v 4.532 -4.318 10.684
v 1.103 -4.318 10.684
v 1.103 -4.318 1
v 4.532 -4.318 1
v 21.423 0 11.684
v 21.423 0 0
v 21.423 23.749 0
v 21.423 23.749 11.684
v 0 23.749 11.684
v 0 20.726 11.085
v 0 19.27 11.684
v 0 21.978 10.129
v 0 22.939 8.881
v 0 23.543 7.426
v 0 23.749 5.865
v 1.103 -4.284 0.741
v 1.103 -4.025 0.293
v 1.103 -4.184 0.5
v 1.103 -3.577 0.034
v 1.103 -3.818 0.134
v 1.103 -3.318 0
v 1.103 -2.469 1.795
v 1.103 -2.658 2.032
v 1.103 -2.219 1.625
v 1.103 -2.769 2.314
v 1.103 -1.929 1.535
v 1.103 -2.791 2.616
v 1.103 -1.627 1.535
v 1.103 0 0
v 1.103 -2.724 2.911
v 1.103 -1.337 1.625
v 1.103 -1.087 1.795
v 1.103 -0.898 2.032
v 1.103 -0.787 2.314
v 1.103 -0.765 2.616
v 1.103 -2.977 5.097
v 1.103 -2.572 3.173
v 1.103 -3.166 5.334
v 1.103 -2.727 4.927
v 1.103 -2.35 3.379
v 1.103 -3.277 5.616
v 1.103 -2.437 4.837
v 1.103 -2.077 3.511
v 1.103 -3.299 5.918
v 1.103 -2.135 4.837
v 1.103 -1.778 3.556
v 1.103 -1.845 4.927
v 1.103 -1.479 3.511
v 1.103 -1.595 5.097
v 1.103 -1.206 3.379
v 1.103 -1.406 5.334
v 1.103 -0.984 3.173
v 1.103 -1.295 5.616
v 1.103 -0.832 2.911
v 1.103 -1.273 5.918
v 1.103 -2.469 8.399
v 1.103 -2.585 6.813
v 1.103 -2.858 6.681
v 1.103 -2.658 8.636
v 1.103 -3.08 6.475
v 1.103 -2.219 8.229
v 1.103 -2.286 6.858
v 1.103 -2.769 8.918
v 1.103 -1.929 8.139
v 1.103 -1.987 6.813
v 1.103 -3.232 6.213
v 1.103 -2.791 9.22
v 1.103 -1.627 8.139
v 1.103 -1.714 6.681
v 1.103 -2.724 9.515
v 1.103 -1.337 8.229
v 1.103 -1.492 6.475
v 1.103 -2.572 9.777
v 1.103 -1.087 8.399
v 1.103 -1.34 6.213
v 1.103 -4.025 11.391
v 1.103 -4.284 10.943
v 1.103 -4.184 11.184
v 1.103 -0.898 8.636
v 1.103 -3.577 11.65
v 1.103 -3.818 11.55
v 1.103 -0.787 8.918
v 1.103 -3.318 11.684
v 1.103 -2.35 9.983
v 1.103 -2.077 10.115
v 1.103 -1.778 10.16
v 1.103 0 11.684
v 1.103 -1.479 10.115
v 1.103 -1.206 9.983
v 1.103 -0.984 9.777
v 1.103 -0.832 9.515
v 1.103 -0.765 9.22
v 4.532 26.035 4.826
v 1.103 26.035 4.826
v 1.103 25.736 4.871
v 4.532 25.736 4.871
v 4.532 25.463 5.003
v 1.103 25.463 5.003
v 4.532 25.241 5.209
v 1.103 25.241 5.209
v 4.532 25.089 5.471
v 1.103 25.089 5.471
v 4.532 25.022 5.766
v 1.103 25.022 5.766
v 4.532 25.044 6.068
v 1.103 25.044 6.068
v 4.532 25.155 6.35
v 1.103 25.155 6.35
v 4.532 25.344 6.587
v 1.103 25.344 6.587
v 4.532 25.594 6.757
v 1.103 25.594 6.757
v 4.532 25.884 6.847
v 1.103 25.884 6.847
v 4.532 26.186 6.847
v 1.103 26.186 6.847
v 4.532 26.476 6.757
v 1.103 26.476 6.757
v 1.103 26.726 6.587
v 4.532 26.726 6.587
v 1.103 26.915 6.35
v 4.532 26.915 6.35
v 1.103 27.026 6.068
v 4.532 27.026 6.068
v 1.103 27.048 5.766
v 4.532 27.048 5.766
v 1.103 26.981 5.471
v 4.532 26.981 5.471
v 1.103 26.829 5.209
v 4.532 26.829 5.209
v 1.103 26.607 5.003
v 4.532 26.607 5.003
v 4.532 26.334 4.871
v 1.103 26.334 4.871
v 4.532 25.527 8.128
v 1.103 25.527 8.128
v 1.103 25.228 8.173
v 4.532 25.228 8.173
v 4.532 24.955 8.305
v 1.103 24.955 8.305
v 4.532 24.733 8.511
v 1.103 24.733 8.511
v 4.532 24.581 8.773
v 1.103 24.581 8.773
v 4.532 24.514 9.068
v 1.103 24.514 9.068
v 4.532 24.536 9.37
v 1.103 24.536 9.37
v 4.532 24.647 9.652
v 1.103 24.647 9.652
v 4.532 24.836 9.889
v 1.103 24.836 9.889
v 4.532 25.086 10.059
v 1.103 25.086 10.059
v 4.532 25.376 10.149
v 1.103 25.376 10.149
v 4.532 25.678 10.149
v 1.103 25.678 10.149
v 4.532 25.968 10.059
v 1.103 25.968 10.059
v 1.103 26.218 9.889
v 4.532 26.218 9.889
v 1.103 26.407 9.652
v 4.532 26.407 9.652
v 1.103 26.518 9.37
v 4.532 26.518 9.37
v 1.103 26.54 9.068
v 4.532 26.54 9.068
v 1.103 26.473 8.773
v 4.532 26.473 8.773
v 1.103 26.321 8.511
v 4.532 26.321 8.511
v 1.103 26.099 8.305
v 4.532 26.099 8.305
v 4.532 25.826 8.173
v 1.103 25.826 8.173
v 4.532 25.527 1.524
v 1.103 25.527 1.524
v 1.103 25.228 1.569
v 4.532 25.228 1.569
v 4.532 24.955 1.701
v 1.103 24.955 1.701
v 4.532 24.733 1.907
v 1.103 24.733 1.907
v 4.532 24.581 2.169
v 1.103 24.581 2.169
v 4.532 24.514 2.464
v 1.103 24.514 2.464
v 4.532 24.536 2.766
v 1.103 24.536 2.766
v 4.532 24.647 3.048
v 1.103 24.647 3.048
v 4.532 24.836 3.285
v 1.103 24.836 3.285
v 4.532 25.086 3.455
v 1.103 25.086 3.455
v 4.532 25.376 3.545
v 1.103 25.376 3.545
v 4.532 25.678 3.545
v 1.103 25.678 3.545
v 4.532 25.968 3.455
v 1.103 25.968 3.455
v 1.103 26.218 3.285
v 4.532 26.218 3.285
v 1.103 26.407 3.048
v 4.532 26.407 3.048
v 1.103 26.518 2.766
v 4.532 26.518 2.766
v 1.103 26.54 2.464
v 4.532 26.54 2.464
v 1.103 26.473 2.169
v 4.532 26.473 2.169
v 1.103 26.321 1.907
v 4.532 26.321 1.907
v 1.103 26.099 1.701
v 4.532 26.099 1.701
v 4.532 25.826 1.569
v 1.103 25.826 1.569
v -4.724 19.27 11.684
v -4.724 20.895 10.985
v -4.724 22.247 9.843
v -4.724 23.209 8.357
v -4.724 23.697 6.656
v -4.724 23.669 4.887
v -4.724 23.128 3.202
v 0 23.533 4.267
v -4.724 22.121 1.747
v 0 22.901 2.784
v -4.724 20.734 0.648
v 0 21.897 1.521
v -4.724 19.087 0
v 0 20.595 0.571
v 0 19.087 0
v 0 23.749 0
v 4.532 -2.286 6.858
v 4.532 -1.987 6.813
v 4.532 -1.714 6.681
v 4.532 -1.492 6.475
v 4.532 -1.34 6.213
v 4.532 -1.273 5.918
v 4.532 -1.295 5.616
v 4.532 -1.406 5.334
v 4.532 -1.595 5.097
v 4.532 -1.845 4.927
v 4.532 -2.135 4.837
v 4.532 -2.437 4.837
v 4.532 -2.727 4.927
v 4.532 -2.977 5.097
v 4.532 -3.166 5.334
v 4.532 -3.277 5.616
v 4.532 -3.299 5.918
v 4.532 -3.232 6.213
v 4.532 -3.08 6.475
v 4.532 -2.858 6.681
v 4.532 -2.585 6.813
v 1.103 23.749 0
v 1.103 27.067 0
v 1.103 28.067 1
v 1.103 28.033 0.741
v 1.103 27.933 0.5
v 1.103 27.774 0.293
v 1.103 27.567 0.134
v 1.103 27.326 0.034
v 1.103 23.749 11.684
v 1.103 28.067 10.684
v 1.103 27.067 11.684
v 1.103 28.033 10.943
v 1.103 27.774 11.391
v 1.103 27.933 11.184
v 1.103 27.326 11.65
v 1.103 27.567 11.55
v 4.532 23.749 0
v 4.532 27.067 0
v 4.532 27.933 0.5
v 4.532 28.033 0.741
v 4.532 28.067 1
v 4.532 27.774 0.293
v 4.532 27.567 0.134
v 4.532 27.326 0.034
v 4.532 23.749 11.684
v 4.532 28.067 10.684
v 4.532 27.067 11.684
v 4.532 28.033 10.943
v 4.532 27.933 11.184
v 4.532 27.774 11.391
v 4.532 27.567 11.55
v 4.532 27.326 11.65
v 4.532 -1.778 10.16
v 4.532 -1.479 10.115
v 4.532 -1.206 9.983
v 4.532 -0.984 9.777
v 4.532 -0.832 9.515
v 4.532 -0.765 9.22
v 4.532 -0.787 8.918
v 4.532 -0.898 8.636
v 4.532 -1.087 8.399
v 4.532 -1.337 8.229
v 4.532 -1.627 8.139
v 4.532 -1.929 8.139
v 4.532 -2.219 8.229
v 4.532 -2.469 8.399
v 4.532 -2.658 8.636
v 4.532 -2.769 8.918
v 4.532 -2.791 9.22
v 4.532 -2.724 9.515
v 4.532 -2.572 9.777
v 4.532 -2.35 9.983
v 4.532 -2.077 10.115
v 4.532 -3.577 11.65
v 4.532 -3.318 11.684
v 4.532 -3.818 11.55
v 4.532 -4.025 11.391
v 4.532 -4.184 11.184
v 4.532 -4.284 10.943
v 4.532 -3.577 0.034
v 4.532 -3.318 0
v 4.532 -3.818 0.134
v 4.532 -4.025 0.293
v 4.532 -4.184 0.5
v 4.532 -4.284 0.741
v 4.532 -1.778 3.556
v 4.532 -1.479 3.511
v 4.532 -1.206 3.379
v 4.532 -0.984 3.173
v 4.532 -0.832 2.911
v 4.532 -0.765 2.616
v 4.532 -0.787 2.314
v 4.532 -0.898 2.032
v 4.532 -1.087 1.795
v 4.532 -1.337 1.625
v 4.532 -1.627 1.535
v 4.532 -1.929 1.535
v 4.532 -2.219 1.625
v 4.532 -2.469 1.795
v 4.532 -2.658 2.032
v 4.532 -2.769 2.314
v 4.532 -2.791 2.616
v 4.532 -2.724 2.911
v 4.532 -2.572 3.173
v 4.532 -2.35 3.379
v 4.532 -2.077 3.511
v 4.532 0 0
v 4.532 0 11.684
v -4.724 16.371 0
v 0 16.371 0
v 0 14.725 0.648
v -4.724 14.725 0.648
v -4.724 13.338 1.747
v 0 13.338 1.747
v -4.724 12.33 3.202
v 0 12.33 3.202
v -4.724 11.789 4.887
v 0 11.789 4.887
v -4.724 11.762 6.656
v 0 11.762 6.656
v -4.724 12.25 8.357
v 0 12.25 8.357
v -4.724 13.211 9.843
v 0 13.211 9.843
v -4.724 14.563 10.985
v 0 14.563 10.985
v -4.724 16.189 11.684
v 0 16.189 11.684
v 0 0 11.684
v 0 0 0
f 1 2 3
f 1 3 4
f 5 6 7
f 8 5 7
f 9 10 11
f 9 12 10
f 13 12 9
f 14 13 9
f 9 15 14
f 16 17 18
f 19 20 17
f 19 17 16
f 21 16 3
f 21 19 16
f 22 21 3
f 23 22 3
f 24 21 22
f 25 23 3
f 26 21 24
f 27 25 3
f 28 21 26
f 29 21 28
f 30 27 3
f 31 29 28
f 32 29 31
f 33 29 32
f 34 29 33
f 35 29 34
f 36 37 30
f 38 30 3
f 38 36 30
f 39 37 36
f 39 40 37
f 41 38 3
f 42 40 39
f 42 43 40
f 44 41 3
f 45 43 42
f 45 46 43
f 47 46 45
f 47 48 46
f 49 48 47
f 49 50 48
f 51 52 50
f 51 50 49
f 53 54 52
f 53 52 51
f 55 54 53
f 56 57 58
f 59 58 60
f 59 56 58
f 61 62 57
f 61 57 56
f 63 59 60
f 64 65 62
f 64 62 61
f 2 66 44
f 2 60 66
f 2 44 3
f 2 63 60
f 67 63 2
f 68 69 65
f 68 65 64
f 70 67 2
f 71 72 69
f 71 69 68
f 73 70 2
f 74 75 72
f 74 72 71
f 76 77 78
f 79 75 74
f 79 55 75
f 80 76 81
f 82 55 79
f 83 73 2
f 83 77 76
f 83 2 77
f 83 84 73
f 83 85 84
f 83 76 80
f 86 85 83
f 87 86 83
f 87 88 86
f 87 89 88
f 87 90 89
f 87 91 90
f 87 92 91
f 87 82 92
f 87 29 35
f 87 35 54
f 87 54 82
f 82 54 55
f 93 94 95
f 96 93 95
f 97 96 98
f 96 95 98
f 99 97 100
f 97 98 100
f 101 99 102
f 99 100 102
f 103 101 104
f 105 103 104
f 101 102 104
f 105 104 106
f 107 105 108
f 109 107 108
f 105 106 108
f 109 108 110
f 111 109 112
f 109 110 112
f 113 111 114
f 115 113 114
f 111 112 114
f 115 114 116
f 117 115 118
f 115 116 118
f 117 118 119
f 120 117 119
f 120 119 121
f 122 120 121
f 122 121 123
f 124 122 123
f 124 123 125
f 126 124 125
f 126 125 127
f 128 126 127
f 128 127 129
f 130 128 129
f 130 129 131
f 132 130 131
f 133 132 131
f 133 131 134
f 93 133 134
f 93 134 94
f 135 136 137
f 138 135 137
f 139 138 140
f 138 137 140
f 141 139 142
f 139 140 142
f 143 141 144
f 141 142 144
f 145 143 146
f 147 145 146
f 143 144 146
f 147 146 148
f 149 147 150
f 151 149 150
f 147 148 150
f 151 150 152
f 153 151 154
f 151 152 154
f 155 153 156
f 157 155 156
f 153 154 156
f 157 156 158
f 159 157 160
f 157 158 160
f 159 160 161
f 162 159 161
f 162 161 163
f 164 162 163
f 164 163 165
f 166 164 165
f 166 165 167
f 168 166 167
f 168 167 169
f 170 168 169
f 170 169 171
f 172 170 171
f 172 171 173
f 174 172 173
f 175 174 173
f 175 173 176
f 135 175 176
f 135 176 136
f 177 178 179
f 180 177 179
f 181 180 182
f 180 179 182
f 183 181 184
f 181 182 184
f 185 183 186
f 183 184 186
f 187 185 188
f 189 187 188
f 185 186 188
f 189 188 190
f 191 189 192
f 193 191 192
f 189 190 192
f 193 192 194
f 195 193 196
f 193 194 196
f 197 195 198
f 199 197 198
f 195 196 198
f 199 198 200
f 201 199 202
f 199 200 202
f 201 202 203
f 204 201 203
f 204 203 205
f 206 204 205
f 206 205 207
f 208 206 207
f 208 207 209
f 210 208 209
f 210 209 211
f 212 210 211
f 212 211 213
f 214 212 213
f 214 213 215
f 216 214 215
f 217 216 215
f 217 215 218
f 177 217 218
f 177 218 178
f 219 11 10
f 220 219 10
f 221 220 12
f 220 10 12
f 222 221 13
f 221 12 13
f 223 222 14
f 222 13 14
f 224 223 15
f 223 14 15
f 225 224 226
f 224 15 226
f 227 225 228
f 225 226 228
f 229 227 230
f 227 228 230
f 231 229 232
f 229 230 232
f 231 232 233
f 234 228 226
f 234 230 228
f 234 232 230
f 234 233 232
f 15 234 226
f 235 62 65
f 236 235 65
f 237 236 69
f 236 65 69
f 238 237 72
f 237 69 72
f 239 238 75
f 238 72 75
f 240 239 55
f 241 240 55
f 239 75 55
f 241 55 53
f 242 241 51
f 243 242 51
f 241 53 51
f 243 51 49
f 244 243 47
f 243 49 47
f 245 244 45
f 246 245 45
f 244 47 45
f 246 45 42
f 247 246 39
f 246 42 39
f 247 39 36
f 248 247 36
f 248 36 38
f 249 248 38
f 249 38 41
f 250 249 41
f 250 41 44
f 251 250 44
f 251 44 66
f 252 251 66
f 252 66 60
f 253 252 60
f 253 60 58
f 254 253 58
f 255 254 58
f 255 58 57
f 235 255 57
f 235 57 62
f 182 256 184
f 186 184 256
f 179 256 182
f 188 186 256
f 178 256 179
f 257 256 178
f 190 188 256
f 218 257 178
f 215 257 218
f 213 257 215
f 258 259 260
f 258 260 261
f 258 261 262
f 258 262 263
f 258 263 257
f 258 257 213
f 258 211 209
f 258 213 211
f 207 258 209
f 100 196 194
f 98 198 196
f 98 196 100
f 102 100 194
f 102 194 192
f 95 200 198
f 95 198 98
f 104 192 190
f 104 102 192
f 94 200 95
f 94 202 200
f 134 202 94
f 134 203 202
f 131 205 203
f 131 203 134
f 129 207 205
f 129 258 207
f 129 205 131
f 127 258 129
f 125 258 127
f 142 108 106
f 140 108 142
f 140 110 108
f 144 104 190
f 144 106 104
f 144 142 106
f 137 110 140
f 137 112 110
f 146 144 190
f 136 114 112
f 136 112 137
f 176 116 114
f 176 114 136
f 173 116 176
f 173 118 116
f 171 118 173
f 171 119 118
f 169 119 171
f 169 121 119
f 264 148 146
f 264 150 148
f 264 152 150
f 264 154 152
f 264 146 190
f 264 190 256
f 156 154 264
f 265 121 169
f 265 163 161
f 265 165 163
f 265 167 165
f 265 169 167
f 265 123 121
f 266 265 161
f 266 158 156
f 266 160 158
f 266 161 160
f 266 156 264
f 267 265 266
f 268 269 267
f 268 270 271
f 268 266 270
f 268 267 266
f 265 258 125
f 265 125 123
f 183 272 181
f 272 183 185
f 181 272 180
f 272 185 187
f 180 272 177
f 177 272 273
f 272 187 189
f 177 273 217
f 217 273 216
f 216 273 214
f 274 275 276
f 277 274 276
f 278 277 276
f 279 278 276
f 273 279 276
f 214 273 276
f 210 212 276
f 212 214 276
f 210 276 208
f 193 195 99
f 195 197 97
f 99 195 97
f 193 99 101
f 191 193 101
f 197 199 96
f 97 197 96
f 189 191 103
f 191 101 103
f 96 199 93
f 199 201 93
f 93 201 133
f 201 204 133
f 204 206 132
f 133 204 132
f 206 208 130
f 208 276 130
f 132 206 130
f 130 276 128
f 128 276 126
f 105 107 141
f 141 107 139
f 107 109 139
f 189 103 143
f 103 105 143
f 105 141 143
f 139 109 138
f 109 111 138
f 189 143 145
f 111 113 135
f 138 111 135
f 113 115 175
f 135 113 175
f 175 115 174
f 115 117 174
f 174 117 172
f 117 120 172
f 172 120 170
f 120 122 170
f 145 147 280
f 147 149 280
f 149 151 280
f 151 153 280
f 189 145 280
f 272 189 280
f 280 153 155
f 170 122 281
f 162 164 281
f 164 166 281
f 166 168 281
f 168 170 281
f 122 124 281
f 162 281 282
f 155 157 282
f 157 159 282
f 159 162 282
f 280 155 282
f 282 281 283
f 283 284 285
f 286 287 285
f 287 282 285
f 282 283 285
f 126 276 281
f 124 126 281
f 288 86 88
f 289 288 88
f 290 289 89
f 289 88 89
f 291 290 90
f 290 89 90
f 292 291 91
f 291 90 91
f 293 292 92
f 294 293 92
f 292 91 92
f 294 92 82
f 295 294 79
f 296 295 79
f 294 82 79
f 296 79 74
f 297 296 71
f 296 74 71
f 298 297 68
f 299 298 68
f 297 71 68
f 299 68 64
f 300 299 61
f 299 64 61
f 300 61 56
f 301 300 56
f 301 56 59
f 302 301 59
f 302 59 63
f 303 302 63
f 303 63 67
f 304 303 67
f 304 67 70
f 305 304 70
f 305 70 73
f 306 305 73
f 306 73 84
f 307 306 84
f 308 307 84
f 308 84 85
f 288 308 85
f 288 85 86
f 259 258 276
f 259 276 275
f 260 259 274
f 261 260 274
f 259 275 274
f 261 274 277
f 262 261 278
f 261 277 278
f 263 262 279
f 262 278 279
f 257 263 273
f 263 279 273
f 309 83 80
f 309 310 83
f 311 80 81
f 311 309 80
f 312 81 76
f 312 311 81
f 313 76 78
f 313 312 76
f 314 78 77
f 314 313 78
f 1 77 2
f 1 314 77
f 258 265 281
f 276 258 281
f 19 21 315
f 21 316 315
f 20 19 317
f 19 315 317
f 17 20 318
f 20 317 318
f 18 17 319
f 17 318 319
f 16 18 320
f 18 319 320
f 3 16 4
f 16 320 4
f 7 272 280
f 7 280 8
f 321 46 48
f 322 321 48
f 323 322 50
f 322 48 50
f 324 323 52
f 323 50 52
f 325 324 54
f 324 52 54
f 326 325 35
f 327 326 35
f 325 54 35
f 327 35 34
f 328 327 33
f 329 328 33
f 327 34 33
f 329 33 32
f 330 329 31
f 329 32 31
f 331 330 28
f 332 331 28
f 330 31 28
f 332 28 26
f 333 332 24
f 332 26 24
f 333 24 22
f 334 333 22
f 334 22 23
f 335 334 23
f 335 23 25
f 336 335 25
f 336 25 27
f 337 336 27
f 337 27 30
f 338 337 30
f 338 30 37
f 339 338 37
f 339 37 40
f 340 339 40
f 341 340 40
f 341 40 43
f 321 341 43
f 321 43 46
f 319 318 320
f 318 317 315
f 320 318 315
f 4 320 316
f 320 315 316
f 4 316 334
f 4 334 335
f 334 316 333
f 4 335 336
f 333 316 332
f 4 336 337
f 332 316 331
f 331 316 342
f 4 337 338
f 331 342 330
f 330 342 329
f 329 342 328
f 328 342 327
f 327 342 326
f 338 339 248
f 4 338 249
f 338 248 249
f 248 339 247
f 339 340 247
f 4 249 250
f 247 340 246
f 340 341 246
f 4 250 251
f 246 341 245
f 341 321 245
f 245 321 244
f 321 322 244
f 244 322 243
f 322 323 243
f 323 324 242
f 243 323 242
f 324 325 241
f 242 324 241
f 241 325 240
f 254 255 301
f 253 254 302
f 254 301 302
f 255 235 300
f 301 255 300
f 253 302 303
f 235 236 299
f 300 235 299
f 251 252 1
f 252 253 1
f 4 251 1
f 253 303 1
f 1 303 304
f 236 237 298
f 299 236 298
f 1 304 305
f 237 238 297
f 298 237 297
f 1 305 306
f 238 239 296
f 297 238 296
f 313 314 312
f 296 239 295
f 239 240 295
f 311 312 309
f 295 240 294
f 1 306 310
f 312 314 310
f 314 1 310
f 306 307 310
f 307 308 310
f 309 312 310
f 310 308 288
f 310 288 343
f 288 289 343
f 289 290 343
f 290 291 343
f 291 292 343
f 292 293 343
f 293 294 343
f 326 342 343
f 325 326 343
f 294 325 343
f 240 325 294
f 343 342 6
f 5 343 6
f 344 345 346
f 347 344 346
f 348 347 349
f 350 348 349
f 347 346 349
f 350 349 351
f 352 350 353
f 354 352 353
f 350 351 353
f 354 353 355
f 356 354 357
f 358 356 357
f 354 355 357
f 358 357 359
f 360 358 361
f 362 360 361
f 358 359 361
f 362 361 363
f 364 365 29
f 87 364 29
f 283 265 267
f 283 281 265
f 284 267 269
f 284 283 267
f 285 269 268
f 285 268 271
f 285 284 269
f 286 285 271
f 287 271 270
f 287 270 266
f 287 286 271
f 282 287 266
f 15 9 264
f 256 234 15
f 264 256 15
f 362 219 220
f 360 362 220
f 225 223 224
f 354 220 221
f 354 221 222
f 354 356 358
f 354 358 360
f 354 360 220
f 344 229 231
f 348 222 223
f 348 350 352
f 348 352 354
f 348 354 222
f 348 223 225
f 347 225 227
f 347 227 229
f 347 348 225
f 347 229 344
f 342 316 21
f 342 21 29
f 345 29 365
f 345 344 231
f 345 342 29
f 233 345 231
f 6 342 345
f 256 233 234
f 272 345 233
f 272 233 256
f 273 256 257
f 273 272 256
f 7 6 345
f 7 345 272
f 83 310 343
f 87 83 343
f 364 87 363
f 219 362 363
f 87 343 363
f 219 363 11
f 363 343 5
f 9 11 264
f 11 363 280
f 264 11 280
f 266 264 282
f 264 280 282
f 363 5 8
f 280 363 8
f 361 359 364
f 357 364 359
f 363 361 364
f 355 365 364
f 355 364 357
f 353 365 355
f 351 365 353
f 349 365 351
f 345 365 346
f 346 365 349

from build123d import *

# Parameters (mm, degrees)
ESQUISSE1_W             = 21.4234776
ESQUISSE1_H             = 23.749
BOSS_EXTRU_1_DEPTH      = 11.684
BOSS_EXTRU_2_DEPTH      = 4.318
BOSS_EXTRU_2_DEPTH_BACK = 28.067
ESQUISSE2_W             = 3.429
ESQUISSE2_H             = 11.684
ENL_V_MAT_EXTRU_1_REACH = 38.567
ESQUISSE4_R             = 1.016
CONG_1_R                = 1
ESQUISSE5_R             = 6.0198
BOSS_EXTRU_3_DEPTH      = 4.7244
ESQUISSE6_W             = 1
ESQUISSE6_H             = 23.749
ENL_V_MAT_EXTRU_2_DEPTH = 4.7244


with BuildPart() as part:
    # Esquisse1 → Boss.-Extru.1 (new body)
    with BuildSketch(Plane.XY):
        with Locations((10.7117388, 11.8745)):
            Rectangle(ESQUISSE1_W, ESQUISSE1_H)
    extrude(amount=BOSS_EXTRU_1_DEPTH)

    # Esquisse2 → Boss.-Extru.2 (add, two sides: drawn at the far end of the back side and taken through both)
    with BuildSketch(Plane.XZ.offset(-BOSS_EXTRU_2_DEPTH_BACK)):
        with Locations((2.8179776, 5.842)):
            Rectangle(ESQUISSE2_W, ESQUISSE2_H)
    extrude(amount=BOSS_EXTRU_2_DEPTH + BOSS_EXTRU_2_DEPTH_BACK)

    # Esquisse4 → Enlèv. mat.-Extru.1 (cut, up to next)
    with BuildSketch(Plane.ZY.offset(-1.1034776), mode=Mode.PRIVATE) as enl_v_mat_extru_1_sk1:
        with Locations((2.54, -1.778)):
            Circle(ESQUISSE4_R)
    enl_v_mat_extru_1_tool1 = extrude(enl_v_mat_extru_1_sk1.sketch, amount=-ENL_V_MAT_EXTRU_1_REACH, mode=Mode.PRIVATE) & part.part
    # Esquisse4 → Enlèv. mat.-Extru.1 (cut, up to next)
    with BuildSketch(Plane.ZY.offset(-1.1034776), mode=Mode.PRIVATE) as enl_v_mat_extru_1_sk2:
        with Locations((5.842, -2.286)):
            Circle(ESQUISSE4_R)
    enl_v_mat_extru_1_tool2 = extrude(enl_v_mat_extru_1_sk2.sketch, amount=-ENL_V_MAT_EXTRU_1_REACH, mode=Mode.PRIVATE) & part.part
    # Esquisse4 → Enlèv. mat.-Extru.1 (cut, up to next)
    with BuildSketch(Plane.ZY.offset(-1.1034776), mode=Mode.PRIVATE) as enl_v_mat_extru_1_sk3:
        with Locations((9.144, -1.778)):
            Circle(ESQUISSE4_R)
    enl_v_mat_extru_1_tool3 = extrude(enl_v_mat_extru_1_sk3.sketch, amount=-ENL_V_MAT_EXTRU_1_REACH, mode=Mode.PRIVATE) & part.part
    # Esquisse4 → Enlèv. mat.-Extru.1 (cut, up to next)
    with BuildSketch(Plane.ZY.offset(-1.1034776), mode=Mode.PRIVATE) as enl_v_mat_extru_1_sk4:
        with Locations(Location((9.144, 25.527, 0), (0, 0, 180))):
            Circle(ESQUISSE4_R)
    enl_v_mat_extru_1_tool4 = extrude(enl_v_mat_extru_1_sk4.sketch, amount=-ENL_V_MAT_EXTRU_1_REACH, mode=Mode.PRIVATE) & part.part
    # Esquisse4 → Enlèv. mat.-Extru.1 (cut, up to next)
    with BuildSketch(Plane.ZY.offset(-1.1034776), mode=Mode.PRIVATE) as enl_v_mat_extru_1_sk5:
        with Locations(Location((5.842, 26.035, 0), (0, 0, 180))):
            Circle(ESQUISSE4_R)
    enl_v_mat_extru_1_tool5 = extrude(enl_v_mat_extru_1_sk5.sketch, amount=-ENL_V_MAT_EXTRU_1_REACH, mode=Mode.PRIVATE) & part.part
    # Esquisse4 → Enlèv. mat.-Extru.1 (cut, up to next)
    with BuildSketch(Plane.ZY.offset(-1.1034776), mode=Mode.PRIVATE) as enl_v_mat_extru_1_sk6:
        with Locations(Location((2.54, 25.527, 0), (0, 0, 180))):
            Circle(ESQUISSE4_R)
    enl_v_mat_extru_1_tool6 = extrude(enl_v_mat_extru_1_sk6.sketch, amount=-ENL_V_MAT_EXTRU_1_REACH, mode=Mode.PRIVATE) & part.part
    add(enl_v_mat_extru_1_tool1.solids().sort_by_distance((1.103478, -1.778, 2.54))[0], mode=Mode.SUBTRACT)
    add(enl_v_mat_extru_1_tool2.solids().sort_by_distance((1.103478, -2.286, 5.842))[0], mode=Mode.SUBTRACT)
    add(enl_v_mat_extru_1_tool3.solids().sort_by_distance((1.103478, -1.778, 9.144))[0], mode=Mode.SUBTRACT)
    add(enl_v_mat_extru_1_tool4.solids().sort_by_distance((1.103478, 25.527, 9.144))[0], mode=Mode.SUBTRACT)
    add(enl_v_mat_extru_1_tool5.solids().sort_by_distance((1.103478, 26.035, 5.842))[0], mode=Mode.SUBTRACT)
    add(enl_v_mat_extru_1_tool6.solids().sort_by_distance((1.103478, 25.527, 2.54))[0], mode=Mode.SUBTRACT)

    # Congé1
    cong_1_edges = [part.edges().sort_by_distance(p)[0] for p in [
        (2.8179776, 28.067, 11.684),
        (2.8179776, 28.067, 0),
        (2.8179776, -4.318, 0),
        (2.8179776, -4.318, 11.684),
    ]]
    fillet(cong_1_edges, radius=CONG_1_R)

    # Esquisse5 → Boss.-Extru.3 (add)
    with BuildSketch(Plane.ZY):
        with Locations(Location((5.864615101, 17.7292, 0), (0, 0, 166.962066999))):
            Circle(ESQUISSE5_R)
    extrude(amount=BOSS_EXTRU_3_DEPTH)

    # Esquisse6 → Enlèv. mat.-Extru.2 (cut)
    with BuildSketch(Plane.ZY):
        with Locations((12.184, 11.8745)):
            Rectangle(ESQUISSE6_W, ESQUISSE6_H)
        with Locations((-0.5, 11.8745)):
            Rectangle(ESQUISSE6_W, ESQUISSE6_H)
    extrude(amount=ENL_V_MAT_EXTRU_2_DEPTH, mode=Mode.SUBTRACT)


solid = part.part
